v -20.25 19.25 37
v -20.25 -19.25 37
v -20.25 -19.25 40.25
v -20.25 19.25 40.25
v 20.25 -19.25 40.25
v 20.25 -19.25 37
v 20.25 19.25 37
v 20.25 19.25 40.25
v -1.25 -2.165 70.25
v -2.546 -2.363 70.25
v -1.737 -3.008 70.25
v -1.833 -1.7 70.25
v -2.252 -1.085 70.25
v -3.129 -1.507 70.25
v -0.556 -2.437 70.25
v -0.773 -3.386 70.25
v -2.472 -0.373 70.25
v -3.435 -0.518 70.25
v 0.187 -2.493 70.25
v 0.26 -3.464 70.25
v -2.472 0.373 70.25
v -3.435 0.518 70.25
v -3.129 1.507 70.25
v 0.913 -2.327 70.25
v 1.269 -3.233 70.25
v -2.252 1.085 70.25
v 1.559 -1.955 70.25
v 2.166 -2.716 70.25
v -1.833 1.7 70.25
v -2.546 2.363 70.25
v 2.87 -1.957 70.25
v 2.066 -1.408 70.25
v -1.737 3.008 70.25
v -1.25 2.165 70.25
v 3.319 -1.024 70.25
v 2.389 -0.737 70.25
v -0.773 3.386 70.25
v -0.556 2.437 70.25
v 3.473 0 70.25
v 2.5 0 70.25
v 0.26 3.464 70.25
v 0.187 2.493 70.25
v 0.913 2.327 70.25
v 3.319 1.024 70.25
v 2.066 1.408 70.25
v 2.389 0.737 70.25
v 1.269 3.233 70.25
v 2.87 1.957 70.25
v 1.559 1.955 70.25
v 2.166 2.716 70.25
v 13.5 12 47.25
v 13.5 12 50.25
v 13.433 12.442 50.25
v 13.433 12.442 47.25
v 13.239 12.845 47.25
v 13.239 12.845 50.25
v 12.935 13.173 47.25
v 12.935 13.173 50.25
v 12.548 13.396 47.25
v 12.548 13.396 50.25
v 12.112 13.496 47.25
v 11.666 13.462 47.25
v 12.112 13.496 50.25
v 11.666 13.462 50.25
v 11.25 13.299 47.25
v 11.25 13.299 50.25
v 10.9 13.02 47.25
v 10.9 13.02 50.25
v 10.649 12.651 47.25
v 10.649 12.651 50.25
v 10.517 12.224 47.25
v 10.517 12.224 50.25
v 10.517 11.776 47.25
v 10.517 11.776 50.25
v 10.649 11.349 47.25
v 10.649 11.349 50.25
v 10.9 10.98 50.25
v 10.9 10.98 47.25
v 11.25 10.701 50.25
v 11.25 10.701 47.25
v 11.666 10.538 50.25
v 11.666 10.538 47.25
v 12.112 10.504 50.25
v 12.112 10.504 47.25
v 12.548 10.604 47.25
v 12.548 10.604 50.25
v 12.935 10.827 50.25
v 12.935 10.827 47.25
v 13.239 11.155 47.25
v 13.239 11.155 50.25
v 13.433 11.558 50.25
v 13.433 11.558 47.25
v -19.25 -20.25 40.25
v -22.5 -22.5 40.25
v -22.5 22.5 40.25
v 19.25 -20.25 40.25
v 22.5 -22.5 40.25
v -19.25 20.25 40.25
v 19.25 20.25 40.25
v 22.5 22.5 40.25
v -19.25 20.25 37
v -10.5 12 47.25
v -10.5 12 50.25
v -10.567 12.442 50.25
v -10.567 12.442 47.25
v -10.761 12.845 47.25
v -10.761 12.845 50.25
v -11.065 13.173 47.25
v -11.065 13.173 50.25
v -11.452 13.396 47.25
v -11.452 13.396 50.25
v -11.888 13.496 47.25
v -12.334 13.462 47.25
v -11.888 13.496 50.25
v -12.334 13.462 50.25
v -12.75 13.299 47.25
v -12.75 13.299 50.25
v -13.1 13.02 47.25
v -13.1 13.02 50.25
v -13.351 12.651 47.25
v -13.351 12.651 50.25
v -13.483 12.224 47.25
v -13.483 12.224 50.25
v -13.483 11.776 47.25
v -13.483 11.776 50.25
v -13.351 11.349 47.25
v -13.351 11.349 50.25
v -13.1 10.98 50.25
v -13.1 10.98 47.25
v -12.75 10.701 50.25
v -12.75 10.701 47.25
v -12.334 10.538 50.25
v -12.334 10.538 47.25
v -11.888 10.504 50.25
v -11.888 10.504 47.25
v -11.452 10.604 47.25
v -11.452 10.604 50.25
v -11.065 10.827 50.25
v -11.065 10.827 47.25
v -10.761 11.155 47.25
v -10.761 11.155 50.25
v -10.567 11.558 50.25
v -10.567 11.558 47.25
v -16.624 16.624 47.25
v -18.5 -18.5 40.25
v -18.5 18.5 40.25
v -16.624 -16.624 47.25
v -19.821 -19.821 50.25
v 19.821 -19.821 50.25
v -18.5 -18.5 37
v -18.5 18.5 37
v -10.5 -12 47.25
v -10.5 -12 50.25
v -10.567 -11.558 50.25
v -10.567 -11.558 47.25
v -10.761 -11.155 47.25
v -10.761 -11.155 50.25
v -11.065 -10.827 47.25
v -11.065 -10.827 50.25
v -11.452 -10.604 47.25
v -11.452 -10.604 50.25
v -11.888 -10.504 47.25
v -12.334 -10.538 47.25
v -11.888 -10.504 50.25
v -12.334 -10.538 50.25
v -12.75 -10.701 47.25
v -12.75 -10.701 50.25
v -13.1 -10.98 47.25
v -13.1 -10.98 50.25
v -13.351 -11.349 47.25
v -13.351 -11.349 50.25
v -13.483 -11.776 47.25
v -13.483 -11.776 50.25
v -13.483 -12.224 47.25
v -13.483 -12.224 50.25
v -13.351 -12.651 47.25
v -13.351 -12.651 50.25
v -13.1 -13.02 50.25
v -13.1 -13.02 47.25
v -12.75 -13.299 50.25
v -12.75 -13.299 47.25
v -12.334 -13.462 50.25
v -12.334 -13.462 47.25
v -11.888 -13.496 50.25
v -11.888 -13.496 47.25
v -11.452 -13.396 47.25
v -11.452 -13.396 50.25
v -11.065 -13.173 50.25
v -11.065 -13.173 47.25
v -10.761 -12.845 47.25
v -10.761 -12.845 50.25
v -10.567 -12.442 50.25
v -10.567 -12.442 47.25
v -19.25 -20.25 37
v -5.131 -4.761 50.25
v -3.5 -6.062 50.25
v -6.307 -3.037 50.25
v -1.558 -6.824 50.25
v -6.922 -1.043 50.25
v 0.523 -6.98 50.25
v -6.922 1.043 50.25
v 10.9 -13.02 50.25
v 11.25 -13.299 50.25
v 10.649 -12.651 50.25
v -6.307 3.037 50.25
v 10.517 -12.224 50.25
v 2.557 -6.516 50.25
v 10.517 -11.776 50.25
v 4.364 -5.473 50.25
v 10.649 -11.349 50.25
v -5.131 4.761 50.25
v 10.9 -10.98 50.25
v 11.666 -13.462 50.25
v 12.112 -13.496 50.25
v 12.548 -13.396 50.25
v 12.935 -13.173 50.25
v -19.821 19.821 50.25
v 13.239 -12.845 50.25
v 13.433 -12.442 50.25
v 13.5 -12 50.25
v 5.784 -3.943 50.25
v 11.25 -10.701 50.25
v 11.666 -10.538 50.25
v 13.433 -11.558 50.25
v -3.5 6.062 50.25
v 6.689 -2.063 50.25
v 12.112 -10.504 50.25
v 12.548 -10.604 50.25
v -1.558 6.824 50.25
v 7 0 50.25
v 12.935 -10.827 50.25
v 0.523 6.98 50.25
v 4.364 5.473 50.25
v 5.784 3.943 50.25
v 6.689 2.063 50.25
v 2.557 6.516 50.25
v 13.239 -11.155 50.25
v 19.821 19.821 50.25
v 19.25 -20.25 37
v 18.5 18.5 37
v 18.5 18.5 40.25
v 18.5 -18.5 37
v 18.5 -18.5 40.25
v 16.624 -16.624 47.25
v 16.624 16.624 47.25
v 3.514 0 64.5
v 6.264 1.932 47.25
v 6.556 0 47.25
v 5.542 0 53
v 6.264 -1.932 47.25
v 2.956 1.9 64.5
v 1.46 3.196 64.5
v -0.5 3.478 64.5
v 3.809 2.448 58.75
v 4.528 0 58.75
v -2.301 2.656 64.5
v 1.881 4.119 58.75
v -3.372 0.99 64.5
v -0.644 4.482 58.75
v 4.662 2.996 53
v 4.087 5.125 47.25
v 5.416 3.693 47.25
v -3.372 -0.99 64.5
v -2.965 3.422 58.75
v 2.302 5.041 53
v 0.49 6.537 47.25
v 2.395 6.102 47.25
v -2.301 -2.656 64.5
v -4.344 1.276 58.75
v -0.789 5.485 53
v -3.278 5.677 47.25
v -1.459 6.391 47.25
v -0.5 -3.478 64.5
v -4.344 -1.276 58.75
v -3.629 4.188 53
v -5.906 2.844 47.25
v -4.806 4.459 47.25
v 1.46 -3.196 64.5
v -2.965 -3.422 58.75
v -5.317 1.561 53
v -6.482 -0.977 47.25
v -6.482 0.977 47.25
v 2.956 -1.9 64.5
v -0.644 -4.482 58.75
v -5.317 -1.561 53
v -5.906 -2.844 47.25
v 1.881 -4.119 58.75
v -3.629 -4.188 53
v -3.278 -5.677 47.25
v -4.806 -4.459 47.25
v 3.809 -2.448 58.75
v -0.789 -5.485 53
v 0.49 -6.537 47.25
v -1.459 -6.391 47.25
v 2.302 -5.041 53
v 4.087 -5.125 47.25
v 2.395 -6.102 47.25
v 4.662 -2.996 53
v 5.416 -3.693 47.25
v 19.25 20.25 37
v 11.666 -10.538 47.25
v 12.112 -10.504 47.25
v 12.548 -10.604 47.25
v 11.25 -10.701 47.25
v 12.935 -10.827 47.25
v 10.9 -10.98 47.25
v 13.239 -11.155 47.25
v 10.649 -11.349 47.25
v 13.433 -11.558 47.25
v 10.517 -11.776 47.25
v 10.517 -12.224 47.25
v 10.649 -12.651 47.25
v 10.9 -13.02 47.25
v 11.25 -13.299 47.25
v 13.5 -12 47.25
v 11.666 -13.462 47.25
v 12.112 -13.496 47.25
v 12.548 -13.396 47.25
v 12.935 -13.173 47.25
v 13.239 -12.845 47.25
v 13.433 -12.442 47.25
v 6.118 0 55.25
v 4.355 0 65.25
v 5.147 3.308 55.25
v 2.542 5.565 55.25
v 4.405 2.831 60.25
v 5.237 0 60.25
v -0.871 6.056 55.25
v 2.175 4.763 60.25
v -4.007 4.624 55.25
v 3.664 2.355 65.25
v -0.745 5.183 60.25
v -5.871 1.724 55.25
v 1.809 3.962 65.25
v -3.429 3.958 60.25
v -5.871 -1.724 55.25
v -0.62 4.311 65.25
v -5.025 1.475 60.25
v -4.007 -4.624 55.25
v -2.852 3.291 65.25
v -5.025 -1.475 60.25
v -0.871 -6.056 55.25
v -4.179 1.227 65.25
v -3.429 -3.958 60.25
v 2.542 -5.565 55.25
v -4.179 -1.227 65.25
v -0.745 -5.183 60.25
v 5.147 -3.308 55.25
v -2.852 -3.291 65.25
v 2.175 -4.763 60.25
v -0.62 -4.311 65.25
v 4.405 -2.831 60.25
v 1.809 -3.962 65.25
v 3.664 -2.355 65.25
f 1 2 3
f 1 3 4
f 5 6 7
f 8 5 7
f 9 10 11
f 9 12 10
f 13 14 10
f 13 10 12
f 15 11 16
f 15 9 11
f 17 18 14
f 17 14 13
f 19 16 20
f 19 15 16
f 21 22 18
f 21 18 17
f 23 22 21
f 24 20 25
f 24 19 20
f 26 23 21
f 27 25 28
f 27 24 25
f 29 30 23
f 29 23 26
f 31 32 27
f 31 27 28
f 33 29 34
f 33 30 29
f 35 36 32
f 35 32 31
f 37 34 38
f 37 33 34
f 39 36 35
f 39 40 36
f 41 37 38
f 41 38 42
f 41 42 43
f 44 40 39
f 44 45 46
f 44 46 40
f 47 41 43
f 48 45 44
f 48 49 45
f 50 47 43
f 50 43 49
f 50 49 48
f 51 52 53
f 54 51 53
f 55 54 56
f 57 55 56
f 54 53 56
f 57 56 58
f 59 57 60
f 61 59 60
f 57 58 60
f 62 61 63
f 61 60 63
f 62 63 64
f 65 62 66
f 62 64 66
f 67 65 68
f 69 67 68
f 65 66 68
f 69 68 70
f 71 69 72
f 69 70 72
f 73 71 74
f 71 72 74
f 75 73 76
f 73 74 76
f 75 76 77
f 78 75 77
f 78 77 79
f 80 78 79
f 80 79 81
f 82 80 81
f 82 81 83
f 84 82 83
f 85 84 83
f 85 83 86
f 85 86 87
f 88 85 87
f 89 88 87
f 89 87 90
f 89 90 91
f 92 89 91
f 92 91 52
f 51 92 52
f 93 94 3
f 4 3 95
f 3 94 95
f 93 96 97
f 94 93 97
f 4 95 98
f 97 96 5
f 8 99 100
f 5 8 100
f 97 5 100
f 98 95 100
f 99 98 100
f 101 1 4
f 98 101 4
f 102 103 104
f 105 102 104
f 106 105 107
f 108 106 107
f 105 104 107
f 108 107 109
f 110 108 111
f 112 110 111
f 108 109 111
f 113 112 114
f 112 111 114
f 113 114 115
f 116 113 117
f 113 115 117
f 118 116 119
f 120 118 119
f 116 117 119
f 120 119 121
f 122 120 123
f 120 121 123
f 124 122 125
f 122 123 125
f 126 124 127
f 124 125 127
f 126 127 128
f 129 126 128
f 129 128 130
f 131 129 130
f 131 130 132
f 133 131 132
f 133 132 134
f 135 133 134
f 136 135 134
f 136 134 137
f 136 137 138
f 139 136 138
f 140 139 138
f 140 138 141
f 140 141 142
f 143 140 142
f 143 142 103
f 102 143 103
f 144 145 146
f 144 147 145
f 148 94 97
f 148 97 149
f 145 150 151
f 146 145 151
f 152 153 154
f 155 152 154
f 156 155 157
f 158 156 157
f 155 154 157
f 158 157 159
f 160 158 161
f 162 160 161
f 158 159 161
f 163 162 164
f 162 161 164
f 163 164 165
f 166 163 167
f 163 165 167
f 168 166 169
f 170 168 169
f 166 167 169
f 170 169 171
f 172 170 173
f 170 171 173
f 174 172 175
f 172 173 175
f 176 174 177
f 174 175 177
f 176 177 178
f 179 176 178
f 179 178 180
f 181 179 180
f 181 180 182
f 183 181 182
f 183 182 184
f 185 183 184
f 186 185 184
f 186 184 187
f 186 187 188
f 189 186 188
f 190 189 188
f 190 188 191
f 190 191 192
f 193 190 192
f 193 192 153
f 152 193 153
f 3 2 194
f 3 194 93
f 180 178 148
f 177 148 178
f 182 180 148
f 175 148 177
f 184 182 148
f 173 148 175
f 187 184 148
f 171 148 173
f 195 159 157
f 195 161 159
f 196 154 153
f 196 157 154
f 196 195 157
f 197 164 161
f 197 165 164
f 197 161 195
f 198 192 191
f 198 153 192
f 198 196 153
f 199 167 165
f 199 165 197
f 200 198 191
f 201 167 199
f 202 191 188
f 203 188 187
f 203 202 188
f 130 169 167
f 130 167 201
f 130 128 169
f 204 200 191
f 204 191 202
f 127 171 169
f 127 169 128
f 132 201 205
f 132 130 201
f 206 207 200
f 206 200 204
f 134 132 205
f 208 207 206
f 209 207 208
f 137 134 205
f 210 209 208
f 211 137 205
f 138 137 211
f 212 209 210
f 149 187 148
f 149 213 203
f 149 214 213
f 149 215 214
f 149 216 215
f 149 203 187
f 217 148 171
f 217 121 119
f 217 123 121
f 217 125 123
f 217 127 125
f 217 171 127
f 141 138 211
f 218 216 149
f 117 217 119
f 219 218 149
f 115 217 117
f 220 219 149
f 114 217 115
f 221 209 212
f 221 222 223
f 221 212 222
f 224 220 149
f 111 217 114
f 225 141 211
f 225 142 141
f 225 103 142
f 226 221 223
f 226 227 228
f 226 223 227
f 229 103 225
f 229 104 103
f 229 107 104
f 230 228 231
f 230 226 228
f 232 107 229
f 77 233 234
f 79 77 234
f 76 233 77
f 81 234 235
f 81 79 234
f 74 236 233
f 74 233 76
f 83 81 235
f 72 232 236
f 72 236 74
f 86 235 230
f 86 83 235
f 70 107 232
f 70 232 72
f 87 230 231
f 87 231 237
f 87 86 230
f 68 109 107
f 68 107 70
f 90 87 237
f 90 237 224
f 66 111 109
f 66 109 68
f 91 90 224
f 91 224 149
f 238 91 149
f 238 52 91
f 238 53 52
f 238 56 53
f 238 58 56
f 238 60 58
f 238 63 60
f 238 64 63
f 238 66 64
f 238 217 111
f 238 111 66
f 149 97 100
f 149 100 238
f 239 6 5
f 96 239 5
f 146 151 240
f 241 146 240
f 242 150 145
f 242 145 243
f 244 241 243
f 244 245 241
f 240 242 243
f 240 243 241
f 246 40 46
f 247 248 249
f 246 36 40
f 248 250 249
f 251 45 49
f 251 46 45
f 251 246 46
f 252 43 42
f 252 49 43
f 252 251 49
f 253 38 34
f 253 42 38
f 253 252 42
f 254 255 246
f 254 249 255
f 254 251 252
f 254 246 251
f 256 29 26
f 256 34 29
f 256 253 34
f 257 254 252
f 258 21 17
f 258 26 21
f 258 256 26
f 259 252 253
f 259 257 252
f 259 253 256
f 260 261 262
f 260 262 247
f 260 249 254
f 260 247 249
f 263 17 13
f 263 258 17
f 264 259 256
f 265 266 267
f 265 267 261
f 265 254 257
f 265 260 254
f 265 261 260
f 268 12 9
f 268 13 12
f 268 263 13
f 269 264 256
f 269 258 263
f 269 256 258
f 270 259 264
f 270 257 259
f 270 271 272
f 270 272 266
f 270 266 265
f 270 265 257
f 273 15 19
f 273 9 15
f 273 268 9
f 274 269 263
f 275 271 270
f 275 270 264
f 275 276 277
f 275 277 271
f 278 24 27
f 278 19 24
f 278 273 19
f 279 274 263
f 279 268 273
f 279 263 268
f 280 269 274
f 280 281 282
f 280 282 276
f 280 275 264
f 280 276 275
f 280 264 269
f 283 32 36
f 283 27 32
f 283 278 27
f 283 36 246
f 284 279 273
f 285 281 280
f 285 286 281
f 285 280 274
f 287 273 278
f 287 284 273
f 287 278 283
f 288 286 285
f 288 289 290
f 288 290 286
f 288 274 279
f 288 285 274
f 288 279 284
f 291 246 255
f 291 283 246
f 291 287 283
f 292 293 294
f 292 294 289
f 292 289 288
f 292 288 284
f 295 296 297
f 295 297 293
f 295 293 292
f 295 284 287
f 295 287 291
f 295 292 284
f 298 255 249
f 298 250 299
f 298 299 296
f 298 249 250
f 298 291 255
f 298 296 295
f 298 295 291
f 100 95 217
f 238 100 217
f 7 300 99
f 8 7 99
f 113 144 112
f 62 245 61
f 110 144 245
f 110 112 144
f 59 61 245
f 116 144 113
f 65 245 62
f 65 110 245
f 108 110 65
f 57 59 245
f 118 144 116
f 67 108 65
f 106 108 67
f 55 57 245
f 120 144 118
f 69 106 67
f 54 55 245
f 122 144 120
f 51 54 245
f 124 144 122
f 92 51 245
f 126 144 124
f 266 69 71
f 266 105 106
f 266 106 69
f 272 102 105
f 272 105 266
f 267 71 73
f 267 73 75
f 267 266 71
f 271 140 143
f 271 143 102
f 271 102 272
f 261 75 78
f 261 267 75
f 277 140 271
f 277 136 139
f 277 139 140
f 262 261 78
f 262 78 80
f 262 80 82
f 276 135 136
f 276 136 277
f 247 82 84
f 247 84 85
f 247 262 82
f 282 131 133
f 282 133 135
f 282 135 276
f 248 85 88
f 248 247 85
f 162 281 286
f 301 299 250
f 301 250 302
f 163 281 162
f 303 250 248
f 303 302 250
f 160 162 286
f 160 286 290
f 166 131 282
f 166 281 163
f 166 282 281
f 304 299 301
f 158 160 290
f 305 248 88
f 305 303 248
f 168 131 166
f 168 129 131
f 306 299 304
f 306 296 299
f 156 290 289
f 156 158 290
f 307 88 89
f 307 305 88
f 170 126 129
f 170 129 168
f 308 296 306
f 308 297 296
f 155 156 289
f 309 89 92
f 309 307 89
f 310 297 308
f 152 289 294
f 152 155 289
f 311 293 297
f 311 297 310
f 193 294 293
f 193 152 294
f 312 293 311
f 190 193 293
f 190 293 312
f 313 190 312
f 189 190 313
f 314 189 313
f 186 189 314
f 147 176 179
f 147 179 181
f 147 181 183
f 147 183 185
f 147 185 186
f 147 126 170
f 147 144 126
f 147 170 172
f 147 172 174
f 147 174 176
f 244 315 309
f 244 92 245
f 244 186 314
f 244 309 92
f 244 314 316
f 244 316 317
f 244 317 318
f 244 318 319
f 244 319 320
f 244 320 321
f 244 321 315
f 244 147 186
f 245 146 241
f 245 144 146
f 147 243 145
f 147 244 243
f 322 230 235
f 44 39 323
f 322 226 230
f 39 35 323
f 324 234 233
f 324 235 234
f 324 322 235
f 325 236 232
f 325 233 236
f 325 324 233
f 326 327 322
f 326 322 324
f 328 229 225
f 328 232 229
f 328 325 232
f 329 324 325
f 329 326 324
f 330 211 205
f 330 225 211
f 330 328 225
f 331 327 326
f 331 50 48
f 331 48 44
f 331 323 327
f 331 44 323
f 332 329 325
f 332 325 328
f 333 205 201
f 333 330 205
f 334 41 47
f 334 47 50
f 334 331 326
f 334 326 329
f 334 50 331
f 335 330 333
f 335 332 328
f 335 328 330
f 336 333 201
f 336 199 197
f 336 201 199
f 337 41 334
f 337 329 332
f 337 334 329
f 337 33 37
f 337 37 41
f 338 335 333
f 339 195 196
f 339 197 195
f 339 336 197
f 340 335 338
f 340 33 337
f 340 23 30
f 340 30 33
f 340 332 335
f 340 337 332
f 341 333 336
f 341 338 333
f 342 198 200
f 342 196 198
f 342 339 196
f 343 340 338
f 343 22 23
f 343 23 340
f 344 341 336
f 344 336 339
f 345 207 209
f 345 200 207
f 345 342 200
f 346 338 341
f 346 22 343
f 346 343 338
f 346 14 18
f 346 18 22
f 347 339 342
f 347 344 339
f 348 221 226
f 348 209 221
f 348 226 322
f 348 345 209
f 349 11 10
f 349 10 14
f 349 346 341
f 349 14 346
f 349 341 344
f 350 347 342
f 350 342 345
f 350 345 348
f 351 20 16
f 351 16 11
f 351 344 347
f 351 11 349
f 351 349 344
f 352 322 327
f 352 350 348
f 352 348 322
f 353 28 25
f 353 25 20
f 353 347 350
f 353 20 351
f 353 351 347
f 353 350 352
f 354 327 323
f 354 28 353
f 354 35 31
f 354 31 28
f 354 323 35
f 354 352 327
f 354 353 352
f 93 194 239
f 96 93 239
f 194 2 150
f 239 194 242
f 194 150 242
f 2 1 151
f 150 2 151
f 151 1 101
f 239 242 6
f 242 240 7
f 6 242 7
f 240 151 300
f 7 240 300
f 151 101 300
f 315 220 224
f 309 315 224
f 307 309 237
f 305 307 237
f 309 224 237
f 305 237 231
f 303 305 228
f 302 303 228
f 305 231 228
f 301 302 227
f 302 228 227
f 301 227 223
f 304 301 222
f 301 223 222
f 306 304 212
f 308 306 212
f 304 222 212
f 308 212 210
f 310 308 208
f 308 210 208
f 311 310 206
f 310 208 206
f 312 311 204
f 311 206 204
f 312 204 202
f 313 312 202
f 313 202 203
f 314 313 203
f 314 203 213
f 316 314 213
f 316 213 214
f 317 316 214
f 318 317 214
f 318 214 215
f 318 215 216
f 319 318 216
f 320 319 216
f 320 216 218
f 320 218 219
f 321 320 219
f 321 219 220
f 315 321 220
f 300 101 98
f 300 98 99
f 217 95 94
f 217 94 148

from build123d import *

# Parameters (mm, degrees)
SKETCH004_W     = 40.5
SKETCH004_H     = 40.5
SKETCH004_W_2   = 37
SKETCH004_H_2   = 37
PAD001_DEPTH    = 3.25
SKETCH005_W     = 45
SKETCH005_H     = 45
PAD002_DEPTH    = 10
PAD002_TAPER    = 15
SKETCH006_W     = 37
SKETCH006_H     = 37
POCKET003_DEPTH = 7
POCKET003_TAPER = 15
SKETCH007_R     = 7
PAD003_DEPTH    = 20
PAD003_TAPER    = 10
SKETCH008_R     = 2.5
POCKET004_DEPTH = 25
POCKET004_TAPER = -10
SKETCH009_R     = 1.5
POCKET005_DEPTH = 13.251
CHAMFER001_SIZE = 1


with BuildPart() as part:
    # Sketch004 (on Face1 of Binder) → Pad001 (new body)
    with BuildSketch(Plane.XY.offset(37)):
        Rectangle(SKETCH004_W, SKETCH004_H)
        Rectangle(SKETCH004_W_2, SKETCH004_H_2, mode=Mode.SUBTRACT)
    extrude(amount=PAD001_DEPTH)

    # Sketch005 (on Face10 of Pad001) → Pad002 (join)
    with BuildSketch(Plane.XY.offset(40.25)):
        Rectangle(SKETCH005_W, SKETCH005_H)
    extrude(amount=PAD002_DEPTH, taper=PAD002_TAPER)

    # Sketch006 (on Face15 of Pad002) → Pocket003 (cut)
    with BuildSketch(Plane(origin=(0, 0, 40.25), x_dir=(1, 0, 0), z_dir=(0, 0, -1))):
        Rectangle(SKETCH006_W, SKETCH006_H)
    extrude(amount=-POCKET003_DEPTH, taper=POCKET003_TAPER, mode=Mode.SUBTRACT)

    # Sketch007 (on Face19 of Pocket003) → Pad003 (join)
    with BuildSketch(Plane.XY.offset(50.25)):
        Circle(SKETCH007_R)
    extrude(amount=PAD003_DEPTH, taper=PAD003_TAPER)

    # Sketch008 (on Face22 of Pad003) → Pocket004 (cut)
    with BuildSketch(Plane.XY.offset(70.25)):
        Circle(SKETCH008_R)
    extrude(amount=-POCKET004_DEPTH, taper=POCKET004_TAPER, mode=Mode.SUBTRACT)

    # Sketch009 (on Face19 of Pocket004) → Pocket005 (cut, through all)
    with BuildSketch(Plane.XY.offset(50.25)):
        with Locations((-12, 12)):
            Circle(SKETCH009_R)
        with Locations((12, 12)):
            Circle(SKETCH009_R)
        with Locations((-12, -12)):
            Circle(SKETCH009_R)
        with Locations((12, -12)):
            Circle(SKETCH009_R)
    extrude(amount=-POCKET005_DEPTH, mode=Mode.SUBTRACT)

    # Chamfer001
    chamfer001_edges = [part.edges().sort_by_distance(p)[0] for p in [
        (20.25, -20.25, 38.625),
        (-20.25, -20.25, 38.625),
        (-20.25, 20.25, 38.625),
        (20.25, 20.25, 38.625),
    ]]
    chamfer(chamfer001_edges, length=CHAMFER001_SIZE)


solid = part.part
